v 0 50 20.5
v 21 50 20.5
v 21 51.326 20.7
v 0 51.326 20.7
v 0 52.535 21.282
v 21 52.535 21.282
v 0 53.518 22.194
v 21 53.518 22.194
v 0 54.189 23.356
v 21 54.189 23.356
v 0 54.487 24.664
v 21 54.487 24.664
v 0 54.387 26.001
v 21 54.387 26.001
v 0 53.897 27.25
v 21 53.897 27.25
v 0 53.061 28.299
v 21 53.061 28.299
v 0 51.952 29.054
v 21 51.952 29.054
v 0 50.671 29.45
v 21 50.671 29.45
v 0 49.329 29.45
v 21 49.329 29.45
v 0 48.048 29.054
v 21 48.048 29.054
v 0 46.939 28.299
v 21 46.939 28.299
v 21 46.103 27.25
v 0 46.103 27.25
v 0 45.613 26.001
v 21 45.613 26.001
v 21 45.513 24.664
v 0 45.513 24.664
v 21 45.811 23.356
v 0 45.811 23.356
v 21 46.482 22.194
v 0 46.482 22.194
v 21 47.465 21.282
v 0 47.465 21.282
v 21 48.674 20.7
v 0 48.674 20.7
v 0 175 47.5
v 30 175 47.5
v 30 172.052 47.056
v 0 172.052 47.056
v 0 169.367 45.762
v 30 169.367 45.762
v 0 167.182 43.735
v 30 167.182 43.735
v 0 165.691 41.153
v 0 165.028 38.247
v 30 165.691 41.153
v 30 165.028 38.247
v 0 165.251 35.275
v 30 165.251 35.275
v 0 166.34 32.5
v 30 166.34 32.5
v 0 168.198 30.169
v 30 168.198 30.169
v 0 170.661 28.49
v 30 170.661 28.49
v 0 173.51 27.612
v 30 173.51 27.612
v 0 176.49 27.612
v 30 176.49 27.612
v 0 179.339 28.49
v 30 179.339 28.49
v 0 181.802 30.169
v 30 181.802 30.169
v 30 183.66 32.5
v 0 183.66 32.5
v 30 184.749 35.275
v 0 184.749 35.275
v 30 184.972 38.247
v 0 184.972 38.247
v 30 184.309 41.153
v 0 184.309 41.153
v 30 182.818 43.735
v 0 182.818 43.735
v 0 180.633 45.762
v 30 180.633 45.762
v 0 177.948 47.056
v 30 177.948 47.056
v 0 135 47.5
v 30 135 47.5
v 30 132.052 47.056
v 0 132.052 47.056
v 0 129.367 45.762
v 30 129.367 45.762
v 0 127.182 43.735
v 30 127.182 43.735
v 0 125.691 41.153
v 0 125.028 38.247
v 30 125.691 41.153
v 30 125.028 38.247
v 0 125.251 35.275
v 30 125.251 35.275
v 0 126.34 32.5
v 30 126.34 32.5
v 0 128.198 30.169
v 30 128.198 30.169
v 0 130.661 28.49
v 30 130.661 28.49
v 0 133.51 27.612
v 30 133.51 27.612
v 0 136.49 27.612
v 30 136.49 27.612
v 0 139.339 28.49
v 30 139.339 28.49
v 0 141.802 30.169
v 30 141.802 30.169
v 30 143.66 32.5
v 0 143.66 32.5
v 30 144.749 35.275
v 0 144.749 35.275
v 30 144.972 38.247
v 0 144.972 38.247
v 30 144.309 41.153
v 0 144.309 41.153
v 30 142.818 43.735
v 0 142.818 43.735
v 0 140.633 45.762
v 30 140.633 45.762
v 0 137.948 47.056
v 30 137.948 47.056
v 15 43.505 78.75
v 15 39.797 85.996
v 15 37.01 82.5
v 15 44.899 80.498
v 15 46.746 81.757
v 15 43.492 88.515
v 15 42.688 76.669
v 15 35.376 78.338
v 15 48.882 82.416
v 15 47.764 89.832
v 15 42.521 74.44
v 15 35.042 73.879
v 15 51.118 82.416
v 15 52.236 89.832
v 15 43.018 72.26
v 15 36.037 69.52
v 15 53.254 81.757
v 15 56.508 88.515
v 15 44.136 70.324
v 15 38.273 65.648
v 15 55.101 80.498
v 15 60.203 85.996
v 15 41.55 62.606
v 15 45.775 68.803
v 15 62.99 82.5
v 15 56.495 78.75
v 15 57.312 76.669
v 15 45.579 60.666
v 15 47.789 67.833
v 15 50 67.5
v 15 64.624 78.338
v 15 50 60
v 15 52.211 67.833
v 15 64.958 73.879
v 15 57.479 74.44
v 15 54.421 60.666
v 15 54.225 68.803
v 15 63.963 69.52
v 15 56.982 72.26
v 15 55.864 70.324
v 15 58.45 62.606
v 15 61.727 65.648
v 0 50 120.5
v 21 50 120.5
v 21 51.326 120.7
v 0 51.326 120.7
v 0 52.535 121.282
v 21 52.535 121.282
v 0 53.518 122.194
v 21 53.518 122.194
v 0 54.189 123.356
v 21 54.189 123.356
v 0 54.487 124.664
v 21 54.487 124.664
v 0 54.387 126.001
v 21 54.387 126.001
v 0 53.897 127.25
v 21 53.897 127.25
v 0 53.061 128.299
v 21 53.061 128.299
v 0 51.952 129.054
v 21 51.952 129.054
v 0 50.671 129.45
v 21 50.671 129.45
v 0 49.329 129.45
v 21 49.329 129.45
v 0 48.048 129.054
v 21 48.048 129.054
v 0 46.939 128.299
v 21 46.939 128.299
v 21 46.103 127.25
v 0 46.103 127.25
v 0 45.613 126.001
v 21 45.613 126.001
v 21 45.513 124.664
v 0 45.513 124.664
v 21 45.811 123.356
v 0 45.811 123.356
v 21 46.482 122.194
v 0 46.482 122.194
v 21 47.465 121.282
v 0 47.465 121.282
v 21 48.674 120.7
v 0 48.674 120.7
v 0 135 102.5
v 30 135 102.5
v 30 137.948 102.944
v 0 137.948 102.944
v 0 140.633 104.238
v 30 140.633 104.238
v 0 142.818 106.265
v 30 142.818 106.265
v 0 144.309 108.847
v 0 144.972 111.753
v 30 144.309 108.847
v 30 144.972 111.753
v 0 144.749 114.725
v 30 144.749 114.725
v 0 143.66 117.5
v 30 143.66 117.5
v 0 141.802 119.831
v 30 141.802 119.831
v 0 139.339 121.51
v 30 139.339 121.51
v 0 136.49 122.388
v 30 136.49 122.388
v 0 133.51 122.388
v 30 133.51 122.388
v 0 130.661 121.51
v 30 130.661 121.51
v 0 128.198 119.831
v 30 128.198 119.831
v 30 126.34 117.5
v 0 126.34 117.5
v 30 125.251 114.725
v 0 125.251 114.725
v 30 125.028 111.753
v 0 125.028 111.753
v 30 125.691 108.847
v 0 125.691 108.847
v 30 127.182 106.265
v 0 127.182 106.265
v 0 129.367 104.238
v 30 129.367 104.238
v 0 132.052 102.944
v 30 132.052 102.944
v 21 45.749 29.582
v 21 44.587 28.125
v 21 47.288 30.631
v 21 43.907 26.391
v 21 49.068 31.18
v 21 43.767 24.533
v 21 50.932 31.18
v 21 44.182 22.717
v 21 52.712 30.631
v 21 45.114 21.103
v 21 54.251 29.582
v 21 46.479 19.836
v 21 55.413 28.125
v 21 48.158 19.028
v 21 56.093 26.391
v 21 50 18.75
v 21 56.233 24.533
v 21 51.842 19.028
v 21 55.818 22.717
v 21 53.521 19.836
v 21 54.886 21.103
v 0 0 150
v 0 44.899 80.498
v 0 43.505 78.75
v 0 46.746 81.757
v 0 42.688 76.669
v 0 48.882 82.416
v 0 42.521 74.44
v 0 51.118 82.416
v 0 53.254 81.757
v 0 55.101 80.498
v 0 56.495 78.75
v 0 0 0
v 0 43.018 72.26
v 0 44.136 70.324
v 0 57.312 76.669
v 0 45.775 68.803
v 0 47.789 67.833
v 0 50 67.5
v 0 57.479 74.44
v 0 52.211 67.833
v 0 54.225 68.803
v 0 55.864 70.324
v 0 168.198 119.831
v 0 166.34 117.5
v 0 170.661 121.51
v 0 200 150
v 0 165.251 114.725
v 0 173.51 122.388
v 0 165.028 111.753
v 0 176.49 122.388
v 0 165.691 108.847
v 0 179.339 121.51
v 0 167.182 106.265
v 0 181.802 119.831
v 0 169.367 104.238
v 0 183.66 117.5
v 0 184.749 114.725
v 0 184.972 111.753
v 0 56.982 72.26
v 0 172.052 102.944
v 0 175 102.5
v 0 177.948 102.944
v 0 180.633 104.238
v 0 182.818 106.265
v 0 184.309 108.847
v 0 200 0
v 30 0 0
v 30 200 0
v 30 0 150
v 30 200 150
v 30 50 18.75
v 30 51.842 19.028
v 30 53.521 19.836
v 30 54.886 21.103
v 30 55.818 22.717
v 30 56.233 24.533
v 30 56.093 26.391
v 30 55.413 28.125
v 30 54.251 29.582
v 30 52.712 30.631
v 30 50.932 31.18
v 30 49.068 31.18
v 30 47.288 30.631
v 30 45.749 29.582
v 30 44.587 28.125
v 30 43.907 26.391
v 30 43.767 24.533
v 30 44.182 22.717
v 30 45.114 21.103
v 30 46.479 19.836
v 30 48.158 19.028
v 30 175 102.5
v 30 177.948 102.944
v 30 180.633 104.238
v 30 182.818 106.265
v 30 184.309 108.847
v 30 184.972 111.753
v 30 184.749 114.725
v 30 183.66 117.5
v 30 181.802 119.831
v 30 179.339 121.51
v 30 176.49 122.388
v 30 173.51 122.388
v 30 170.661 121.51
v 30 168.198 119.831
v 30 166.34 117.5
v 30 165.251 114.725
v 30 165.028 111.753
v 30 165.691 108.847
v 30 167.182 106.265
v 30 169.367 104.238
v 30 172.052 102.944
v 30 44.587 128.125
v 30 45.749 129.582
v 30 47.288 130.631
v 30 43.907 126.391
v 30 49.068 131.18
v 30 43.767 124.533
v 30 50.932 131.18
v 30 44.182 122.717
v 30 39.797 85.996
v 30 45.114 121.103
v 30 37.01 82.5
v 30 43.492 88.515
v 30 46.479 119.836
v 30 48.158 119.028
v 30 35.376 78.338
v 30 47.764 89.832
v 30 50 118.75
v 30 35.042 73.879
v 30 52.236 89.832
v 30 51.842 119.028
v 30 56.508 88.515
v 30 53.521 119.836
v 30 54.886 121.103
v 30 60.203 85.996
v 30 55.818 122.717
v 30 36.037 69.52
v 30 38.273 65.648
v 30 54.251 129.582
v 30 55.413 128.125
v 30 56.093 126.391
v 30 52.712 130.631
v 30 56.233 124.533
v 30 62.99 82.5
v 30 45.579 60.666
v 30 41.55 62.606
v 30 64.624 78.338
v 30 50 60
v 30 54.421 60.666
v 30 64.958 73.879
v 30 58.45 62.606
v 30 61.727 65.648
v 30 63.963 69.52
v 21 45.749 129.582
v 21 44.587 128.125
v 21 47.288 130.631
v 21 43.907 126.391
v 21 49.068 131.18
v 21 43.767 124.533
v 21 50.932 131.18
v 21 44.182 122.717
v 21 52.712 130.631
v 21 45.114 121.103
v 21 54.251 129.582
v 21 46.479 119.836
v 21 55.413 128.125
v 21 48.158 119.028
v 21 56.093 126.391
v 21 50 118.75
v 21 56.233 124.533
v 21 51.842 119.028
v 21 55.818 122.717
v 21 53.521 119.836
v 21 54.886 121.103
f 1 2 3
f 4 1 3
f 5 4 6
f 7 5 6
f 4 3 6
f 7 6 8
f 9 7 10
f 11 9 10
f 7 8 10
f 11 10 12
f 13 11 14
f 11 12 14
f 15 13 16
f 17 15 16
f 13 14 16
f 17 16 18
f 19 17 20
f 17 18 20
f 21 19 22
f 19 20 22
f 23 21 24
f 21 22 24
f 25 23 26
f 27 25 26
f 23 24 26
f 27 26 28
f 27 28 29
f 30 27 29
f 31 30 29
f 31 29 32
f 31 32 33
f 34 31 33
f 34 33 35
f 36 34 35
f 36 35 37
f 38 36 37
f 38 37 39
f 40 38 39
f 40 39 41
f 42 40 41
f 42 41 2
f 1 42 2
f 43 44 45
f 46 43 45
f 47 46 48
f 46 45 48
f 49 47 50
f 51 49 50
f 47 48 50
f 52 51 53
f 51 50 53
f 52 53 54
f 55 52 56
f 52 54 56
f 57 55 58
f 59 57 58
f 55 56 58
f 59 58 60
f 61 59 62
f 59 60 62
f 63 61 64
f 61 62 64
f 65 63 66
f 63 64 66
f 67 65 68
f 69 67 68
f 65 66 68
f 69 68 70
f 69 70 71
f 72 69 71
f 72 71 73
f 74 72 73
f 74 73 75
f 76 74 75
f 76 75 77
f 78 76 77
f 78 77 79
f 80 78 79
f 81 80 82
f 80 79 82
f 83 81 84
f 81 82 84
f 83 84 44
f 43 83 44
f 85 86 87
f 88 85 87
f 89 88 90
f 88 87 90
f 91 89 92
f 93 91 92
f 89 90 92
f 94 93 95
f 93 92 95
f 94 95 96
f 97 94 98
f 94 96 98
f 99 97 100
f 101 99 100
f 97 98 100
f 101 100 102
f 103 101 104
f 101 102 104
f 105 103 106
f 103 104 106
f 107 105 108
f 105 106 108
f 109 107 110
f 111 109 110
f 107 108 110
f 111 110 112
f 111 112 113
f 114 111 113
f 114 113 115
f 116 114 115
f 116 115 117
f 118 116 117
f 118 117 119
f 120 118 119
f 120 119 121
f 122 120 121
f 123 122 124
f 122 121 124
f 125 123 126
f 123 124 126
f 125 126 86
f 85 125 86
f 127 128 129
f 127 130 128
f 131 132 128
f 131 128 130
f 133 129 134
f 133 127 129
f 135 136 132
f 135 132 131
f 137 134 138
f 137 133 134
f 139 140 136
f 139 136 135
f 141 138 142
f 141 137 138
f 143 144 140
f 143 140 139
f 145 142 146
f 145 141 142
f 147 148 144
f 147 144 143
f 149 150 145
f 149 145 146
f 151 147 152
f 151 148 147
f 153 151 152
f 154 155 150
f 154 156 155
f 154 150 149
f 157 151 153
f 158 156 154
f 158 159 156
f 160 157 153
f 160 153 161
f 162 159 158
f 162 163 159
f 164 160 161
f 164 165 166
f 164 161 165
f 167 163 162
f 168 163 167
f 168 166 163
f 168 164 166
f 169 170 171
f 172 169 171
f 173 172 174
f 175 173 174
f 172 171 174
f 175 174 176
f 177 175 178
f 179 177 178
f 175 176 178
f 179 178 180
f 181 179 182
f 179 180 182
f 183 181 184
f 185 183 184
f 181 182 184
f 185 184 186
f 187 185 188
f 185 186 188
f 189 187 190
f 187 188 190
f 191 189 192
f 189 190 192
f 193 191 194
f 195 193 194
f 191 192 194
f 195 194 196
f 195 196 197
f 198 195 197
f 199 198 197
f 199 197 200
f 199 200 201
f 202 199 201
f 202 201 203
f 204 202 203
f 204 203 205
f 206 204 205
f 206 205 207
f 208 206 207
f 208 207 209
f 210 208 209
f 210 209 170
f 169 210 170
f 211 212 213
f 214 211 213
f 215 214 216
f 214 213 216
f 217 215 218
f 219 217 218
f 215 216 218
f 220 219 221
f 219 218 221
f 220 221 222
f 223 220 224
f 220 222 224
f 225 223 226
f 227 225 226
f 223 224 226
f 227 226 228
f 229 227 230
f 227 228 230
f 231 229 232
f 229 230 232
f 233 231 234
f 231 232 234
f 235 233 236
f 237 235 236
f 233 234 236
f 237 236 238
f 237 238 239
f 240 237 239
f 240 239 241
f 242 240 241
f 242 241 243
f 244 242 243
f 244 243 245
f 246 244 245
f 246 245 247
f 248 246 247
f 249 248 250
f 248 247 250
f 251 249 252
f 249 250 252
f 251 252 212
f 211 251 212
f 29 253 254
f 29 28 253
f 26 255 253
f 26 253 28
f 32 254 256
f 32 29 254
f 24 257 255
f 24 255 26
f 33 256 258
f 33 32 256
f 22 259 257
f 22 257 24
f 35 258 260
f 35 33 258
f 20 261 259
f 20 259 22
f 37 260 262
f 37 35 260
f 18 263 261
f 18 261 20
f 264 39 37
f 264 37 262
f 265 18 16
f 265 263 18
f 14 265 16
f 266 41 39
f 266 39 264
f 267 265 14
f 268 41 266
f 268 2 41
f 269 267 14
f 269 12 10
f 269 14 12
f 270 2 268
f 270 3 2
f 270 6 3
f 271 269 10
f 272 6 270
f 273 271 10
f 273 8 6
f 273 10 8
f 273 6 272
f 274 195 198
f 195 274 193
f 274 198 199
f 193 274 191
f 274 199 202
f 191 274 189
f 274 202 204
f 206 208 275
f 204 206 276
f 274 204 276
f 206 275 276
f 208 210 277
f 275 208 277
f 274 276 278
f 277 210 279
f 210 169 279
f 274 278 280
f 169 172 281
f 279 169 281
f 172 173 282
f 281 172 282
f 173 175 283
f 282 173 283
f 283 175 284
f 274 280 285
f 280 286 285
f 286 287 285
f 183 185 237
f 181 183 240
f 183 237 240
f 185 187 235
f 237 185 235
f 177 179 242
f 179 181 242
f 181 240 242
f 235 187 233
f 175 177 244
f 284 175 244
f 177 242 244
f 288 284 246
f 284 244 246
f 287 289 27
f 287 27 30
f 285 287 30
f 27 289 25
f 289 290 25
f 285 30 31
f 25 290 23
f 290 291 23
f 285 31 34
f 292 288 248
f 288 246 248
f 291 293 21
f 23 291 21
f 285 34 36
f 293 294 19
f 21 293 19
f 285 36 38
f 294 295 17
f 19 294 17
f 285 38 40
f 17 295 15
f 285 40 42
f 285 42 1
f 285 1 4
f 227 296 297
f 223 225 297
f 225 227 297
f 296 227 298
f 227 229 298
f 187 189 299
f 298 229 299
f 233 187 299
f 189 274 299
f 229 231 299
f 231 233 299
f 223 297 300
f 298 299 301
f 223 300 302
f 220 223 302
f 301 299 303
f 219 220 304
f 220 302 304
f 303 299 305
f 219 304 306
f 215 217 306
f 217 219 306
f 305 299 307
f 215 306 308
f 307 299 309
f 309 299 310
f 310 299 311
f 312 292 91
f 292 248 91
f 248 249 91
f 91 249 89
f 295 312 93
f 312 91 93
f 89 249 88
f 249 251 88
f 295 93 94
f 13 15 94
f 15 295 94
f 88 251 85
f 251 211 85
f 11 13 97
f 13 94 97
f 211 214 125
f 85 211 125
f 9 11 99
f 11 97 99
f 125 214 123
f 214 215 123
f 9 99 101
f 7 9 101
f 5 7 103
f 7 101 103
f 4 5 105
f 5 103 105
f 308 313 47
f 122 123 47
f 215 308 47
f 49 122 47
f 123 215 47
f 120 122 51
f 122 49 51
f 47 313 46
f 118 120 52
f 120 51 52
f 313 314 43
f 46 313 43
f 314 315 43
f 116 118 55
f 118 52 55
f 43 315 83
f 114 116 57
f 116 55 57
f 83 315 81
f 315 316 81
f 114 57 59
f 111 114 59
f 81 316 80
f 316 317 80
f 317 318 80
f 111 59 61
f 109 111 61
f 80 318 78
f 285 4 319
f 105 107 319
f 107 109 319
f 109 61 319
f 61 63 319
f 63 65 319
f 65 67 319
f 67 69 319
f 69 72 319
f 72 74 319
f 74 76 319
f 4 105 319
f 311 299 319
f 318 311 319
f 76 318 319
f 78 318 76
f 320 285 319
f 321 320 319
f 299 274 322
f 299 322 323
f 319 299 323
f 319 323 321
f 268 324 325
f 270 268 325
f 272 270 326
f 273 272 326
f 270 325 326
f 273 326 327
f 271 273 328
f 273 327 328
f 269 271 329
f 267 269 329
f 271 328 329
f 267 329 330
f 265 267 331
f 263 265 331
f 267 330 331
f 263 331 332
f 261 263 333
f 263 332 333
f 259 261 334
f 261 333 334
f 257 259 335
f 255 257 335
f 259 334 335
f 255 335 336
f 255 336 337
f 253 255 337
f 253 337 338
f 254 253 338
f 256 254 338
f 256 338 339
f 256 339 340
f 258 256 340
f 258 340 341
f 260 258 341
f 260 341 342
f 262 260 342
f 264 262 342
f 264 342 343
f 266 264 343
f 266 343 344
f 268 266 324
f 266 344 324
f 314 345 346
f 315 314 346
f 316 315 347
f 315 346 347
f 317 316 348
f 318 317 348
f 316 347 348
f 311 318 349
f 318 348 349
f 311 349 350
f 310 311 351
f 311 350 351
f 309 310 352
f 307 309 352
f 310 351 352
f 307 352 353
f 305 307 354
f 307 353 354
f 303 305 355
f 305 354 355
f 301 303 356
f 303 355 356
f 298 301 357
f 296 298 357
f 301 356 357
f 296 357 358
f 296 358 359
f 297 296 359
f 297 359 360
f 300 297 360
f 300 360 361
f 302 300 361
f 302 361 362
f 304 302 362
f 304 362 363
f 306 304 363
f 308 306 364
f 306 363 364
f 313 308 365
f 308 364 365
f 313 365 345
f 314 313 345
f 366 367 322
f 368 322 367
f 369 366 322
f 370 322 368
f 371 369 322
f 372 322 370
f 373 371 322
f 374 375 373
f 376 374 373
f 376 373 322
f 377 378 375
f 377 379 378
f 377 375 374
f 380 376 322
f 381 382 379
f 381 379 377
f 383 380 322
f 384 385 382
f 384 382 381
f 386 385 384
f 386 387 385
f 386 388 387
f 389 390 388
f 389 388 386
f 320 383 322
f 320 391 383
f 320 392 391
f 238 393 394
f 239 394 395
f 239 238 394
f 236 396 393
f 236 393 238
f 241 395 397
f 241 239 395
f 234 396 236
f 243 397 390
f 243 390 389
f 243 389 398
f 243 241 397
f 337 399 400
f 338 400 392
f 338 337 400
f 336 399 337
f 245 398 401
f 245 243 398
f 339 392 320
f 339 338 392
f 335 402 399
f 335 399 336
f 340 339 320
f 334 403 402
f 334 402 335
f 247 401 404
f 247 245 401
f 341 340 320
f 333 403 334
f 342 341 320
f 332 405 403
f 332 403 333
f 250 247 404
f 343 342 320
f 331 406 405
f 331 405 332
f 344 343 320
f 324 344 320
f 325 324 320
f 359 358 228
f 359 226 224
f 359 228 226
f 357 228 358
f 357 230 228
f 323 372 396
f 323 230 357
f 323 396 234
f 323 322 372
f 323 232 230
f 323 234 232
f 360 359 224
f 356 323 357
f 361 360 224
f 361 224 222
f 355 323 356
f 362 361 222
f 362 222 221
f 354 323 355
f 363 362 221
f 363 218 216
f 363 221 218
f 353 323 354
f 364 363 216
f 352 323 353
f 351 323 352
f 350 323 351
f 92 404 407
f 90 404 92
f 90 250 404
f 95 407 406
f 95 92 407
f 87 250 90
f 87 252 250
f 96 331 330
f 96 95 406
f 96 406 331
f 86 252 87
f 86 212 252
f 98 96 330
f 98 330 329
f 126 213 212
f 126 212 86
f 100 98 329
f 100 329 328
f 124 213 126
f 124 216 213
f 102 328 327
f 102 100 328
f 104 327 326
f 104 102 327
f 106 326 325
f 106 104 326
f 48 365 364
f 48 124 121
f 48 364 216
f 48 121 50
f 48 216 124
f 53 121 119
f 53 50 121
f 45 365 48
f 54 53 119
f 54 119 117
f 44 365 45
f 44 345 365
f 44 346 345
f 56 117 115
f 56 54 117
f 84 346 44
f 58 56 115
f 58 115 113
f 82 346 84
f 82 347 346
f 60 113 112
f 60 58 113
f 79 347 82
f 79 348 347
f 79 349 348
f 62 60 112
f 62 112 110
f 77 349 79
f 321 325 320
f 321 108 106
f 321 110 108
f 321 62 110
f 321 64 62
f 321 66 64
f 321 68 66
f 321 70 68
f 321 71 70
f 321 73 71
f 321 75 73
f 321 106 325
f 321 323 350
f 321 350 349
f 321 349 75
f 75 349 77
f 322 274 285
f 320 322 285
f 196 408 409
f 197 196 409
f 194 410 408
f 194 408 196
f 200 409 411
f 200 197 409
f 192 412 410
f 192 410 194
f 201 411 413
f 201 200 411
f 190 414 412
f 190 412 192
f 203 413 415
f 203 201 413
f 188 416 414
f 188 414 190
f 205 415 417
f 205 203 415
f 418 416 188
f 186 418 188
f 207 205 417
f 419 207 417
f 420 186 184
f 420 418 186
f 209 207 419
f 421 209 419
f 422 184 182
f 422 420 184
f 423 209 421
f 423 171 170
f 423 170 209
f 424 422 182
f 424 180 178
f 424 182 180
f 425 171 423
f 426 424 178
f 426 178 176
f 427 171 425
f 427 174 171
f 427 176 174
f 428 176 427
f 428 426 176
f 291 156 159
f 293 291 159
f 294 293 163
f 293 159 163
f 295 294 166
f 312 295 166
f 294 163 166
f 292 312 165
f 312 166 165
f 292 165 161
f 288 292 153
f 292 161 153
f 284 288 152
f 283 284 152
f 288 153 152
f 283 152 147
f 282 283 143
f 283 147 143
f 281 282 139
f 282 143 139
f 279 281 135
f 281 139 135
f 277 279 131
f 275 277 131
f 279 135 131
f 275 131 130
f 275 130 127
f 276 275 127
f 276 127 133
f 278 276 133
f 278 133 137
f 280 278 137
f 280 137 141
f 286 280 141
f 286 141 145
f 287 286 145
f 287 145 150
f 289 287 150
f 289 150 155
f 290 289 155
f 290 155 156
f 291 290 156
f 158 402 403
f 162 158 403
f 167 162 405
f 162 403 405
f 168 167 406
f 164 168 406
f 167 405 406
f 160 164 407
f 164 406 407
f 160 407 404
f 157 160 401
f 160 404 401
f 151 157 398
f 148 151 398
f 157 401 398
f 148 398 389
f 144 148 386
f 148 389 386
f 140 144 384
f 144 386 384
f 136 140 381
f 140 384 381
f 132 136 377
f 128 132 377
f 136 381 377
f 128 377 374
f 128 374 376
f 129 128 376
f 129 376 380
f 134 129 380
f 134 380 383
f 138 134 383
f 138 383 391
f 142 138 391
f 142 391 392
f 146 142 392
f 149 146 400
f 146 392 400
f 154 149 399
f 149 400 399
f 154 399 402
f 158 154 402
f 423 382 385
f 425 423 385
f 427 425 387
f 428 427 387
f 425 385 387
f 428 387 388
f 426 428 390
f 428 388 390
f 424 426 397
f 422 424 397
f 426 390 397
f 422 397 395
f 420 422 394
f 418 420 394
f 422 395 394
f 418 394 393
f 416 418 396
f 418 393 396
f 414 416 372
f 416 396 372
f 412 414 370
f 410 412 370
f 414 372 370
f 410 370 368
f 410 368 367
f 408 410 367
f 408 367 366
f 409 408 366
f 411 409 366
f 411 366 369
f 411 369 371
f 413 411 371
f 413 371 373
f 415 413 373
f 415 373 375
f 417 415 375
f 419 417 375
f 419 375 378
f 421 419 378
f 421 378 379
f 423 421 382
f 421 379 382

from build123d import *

# Parameters (mm, degrees)
SKETCH2_W           = 150
SKETCH2_H           = 200
BOSS_EXTRUDE1_DEPTH = 30
SKETCH3_R           = 10
CUT_EXTRUDE1_DEPTH  = 30
SKETCH4_R           = 15
CUT_EXTRUDE2_DEPTH  = 15
SKETCH6_R           = 7.5
CUT_EXTRUDE3_DEPTH  = 30
SKETCH7_R           = 4.5
CUT_EXTRUDE4_DEPTH  = 30
SKETCH9_R           = 6.25
CUT_EXTRUDE6_DEPTH  = 9


with BuildPart() as part:
    # Sketch2 → Boss-Extrude1 (new body)
    with BuildSketch(Plane(origin=(0, 0, 0), x_dir=(0, 0, -1), z_dir=(1, 0, 0))):
        with Locations((-75, 100)):
            Rectangle(SKETCH2_W, SKETCH2_H)
    extrude(amount=BOSS_EXTRUDE1_DEPTH)

    # Sketch3 → Cut-Extrude1 (cut)
    with BuildSketch(Plane(origin=(30, 0, 0), x_dir=(0, 0, -1), z_dir=(1, 0, 0))):
        with Locations((-112.5, 175)):
            Circle(SKETCH3_R)
        with Locations(Location((-37.5, 175, 0), (0, 0, 180))):
            Circle(SKETCH3_R)
        with Locations((-112.5, 135)):
            Circle(SKETCH3_R)
        with Locations(Location((-37.5, 135, 0), (0, 0, 180))):
            Circle(SKETCH3_R)
    extrude(amount=-CUT_EXTRUDE1_DEPTH, mode=Mode.SUBTRACT)

    # Sketch4 → Cut-Extrude2 (cut)
    with BuildSketch(Plane(origin=(30, 0, 0), x_dir=(0, 0, -1), z_dir=(1, 0, 0))):
        with Locations((-75, 50)):
            Circle(SKETCH4_R)
    extrude(amount=-CUT_EXTRUDE2_DEPTH, mode=Mode.SUBTRACT)

    # Sketch6 → Cut-Extrude3 (cut)
    with BuildSketch(Plane(origin=(30, 0, 0), x_dir=(0, 0, -1), z_dir=(1, 0, 0))):
        with Locations((-75, 50)):
            Circle(SKETCH6_R)
    extrude(amount=-CUT_EXTRUDE3_DEPTH, mode=Mode.SUBTRACT)

    # Sketch7 → Cut-Extrude4 (cut)
    with BuildSketch(Plane(origin=(30, 0, 0), x_dir=(0, 0, -1), z_dir=(1, 0, 0))):
        with Locations((-125, 50)):
            Circle(SKETCH7_R)
        with Locations((-25, 50)):
            Circle(SKETCH7_R)
    extrude(amount=-CUT_EXTRUDE4_DEPTH, mode=Mode.SUBTRACT)

    # Sketch9 → Cut-Extrude6 (cut)
    with BuildSketch(Plane(origin=(30, 0, 0), x_dir=(0, 0, -1), z_dir=(1, 0, 0))):
        with Locations((-125, 50)):
            Circle(SKETCH9_R)
        with Locations((-25, 50)):
            Circle(SKETCH9_R)
    extrude(amount=-CUT_EXTRUDE6_DEPTH, mode=Mode.SUBTRACT)


solid = part.part
